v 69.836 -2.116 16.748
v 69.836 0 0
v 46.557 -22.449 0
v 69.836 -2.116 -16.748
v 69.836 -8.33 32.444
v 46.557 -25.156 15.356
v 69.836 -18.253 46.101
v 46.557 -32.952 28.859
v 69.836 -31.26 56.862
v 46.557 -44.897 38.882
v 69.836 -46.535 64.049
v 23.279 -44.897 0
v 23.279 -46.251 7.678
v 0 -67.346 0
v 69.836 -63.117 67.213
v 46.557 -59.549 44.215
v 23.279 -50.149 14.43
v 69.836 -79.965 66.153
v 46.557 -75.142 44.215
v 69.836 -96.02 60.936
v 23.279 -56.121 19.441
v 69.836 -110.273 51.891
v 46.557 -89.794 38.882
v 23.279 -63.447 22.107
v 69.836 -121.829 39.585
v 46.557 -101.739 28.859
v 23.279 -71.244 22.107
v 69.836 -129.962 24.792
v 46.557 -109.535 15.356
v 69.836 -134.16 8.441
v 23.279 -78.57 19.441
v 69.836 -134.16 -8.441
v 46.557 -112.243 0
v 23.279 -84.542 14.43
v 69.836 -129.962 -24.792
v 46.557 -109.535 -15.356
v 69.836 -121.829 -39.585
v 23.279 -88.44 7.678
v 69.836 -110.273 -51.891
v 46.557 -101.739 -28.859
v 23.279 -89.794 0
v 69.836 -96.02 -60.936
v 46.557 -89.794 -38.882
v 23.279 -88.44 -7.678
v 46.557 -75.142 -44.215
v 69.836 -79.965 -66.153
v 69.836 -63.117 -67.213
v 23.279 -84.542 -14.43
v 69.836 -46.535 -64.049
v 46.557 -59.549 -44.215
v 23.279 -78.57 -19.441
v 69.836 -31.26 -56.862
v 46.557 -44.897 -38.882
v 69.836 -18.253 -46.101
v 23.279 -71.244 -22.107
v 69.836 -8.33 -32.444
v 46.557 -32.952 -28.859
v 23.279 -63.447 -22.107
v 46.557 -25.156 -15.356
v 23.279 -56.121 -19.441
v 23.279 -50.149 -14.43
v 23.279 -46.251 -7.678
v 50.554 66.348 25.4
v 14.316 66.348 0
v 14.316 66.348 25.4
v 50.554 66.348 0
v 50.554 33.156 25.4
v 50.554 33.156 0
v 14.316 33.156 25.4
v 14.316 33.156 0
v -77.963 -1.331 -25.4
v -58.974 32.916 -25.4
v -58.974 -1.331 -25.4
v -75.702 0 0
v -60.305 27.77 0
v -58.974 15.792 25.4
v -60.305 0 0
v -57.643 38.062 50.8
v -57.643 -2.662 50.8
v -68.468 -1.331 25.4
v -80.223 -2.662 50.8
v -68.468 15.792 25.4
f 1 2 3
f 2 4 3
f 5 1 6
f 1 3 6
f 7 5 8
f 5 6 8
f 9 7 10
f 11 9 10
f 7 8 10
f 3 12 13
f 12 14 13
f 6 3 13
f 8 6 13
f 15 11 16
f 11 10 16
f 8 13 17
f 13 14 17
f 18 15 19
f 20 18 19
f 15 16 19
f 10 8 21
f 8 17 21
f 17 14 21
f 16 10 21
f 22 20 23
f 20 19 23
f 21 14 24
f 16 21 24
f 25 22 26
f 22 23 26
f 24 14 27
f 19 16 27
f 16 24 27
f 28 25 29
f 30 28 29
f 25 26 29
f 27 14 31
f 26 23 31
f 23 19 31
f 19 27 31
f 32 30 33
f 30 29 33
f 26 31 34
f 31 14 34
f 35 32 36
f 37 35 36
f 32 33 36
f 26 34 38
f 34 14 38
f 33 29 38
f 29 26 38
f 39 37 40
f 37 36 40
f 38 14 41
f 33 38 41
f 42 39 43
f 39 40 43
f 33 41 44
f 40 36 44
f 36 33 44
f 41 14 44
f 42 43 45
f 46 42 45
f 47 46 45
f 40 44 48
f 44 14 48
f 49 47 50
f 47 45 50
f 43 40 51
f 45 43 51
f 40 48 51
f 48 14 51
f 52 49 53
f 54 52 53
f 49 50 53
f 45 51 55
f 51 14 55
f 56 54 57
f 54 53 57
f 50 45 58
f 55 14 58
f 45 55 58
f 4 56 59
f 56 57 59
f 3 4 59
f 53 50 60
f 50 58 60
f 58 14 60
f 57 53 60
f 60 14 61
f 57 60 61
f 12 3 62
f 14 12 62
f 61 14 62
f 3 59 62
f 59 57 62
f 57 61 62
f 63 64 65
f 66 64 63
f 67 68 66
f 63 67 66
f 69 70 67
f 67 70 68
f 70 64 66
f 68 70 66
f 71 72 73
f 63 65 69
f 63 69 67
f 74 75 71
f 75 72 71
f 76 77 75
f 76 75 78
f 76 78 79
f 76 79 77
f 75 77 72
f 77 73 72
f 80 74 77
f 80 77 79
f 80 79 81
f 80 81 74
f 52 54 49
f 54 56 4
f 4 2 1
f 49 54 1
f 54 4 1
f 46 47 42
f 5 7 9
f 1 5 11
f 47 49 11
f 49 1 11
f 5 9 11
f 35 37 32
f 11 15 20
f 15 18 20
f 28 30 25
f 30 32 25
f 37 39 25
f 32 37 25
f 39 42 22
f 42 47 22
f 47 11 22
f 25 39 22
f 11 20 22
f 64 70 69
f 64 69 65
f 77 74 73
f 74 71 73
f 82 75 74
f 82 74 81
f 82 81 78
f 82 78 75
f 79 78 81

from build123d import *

# Parameters (mm, degrees)
F1_DEPTH      = 50.8
F1_TAPER      = -3
F1_DEPTH_BACK = 25.4
F1_TAPER_BACK = -3
F4_W          = 36.2373590469
F4_H          = 33.1925749779
F6_DEPTH      = 25.4


with BuildPart() as f1:
    # F0 (on Top) → F1 (new body, two sides)
    with BuildSketch(Plane.XY) as f1_sk:
        Polygon((-60.3053607047, 27.7697946876), (-75.7024735212, 0), (-60.3053607047, 0), align=None)
    extrude(amount=F1_DEPTH, taper=F1_TAPER)
    extrude(f1_sk.sketch, amount=-F1_DEPTH_BACK, taper=F1_TAPER_BACK)


with BuildPart() as f3:
    # F2 (on Top) → F3 (revolve)
    with BuildSketch(Plane.XY):
        Polygon((69.8356330395, 0), (0, -67.3455372453), (69.8356330395, -67.3455372453), align=None)
    revolve(axis=Axis((34.9178165197, -67.3455372453, 0), (1, 0, 0)))


with BuildPart() as f6:
    # F4 (on Top) → F6 (new body)
    with BuildSketch(Plane.XY):
        with Locations((32.4351787567, 49.7518032789)):
            Rectangle(F4_W, F4_H)
    extrude(amount=F6_DEPTH)


solid = Compound([f1.part, f3.part, f6.part])
